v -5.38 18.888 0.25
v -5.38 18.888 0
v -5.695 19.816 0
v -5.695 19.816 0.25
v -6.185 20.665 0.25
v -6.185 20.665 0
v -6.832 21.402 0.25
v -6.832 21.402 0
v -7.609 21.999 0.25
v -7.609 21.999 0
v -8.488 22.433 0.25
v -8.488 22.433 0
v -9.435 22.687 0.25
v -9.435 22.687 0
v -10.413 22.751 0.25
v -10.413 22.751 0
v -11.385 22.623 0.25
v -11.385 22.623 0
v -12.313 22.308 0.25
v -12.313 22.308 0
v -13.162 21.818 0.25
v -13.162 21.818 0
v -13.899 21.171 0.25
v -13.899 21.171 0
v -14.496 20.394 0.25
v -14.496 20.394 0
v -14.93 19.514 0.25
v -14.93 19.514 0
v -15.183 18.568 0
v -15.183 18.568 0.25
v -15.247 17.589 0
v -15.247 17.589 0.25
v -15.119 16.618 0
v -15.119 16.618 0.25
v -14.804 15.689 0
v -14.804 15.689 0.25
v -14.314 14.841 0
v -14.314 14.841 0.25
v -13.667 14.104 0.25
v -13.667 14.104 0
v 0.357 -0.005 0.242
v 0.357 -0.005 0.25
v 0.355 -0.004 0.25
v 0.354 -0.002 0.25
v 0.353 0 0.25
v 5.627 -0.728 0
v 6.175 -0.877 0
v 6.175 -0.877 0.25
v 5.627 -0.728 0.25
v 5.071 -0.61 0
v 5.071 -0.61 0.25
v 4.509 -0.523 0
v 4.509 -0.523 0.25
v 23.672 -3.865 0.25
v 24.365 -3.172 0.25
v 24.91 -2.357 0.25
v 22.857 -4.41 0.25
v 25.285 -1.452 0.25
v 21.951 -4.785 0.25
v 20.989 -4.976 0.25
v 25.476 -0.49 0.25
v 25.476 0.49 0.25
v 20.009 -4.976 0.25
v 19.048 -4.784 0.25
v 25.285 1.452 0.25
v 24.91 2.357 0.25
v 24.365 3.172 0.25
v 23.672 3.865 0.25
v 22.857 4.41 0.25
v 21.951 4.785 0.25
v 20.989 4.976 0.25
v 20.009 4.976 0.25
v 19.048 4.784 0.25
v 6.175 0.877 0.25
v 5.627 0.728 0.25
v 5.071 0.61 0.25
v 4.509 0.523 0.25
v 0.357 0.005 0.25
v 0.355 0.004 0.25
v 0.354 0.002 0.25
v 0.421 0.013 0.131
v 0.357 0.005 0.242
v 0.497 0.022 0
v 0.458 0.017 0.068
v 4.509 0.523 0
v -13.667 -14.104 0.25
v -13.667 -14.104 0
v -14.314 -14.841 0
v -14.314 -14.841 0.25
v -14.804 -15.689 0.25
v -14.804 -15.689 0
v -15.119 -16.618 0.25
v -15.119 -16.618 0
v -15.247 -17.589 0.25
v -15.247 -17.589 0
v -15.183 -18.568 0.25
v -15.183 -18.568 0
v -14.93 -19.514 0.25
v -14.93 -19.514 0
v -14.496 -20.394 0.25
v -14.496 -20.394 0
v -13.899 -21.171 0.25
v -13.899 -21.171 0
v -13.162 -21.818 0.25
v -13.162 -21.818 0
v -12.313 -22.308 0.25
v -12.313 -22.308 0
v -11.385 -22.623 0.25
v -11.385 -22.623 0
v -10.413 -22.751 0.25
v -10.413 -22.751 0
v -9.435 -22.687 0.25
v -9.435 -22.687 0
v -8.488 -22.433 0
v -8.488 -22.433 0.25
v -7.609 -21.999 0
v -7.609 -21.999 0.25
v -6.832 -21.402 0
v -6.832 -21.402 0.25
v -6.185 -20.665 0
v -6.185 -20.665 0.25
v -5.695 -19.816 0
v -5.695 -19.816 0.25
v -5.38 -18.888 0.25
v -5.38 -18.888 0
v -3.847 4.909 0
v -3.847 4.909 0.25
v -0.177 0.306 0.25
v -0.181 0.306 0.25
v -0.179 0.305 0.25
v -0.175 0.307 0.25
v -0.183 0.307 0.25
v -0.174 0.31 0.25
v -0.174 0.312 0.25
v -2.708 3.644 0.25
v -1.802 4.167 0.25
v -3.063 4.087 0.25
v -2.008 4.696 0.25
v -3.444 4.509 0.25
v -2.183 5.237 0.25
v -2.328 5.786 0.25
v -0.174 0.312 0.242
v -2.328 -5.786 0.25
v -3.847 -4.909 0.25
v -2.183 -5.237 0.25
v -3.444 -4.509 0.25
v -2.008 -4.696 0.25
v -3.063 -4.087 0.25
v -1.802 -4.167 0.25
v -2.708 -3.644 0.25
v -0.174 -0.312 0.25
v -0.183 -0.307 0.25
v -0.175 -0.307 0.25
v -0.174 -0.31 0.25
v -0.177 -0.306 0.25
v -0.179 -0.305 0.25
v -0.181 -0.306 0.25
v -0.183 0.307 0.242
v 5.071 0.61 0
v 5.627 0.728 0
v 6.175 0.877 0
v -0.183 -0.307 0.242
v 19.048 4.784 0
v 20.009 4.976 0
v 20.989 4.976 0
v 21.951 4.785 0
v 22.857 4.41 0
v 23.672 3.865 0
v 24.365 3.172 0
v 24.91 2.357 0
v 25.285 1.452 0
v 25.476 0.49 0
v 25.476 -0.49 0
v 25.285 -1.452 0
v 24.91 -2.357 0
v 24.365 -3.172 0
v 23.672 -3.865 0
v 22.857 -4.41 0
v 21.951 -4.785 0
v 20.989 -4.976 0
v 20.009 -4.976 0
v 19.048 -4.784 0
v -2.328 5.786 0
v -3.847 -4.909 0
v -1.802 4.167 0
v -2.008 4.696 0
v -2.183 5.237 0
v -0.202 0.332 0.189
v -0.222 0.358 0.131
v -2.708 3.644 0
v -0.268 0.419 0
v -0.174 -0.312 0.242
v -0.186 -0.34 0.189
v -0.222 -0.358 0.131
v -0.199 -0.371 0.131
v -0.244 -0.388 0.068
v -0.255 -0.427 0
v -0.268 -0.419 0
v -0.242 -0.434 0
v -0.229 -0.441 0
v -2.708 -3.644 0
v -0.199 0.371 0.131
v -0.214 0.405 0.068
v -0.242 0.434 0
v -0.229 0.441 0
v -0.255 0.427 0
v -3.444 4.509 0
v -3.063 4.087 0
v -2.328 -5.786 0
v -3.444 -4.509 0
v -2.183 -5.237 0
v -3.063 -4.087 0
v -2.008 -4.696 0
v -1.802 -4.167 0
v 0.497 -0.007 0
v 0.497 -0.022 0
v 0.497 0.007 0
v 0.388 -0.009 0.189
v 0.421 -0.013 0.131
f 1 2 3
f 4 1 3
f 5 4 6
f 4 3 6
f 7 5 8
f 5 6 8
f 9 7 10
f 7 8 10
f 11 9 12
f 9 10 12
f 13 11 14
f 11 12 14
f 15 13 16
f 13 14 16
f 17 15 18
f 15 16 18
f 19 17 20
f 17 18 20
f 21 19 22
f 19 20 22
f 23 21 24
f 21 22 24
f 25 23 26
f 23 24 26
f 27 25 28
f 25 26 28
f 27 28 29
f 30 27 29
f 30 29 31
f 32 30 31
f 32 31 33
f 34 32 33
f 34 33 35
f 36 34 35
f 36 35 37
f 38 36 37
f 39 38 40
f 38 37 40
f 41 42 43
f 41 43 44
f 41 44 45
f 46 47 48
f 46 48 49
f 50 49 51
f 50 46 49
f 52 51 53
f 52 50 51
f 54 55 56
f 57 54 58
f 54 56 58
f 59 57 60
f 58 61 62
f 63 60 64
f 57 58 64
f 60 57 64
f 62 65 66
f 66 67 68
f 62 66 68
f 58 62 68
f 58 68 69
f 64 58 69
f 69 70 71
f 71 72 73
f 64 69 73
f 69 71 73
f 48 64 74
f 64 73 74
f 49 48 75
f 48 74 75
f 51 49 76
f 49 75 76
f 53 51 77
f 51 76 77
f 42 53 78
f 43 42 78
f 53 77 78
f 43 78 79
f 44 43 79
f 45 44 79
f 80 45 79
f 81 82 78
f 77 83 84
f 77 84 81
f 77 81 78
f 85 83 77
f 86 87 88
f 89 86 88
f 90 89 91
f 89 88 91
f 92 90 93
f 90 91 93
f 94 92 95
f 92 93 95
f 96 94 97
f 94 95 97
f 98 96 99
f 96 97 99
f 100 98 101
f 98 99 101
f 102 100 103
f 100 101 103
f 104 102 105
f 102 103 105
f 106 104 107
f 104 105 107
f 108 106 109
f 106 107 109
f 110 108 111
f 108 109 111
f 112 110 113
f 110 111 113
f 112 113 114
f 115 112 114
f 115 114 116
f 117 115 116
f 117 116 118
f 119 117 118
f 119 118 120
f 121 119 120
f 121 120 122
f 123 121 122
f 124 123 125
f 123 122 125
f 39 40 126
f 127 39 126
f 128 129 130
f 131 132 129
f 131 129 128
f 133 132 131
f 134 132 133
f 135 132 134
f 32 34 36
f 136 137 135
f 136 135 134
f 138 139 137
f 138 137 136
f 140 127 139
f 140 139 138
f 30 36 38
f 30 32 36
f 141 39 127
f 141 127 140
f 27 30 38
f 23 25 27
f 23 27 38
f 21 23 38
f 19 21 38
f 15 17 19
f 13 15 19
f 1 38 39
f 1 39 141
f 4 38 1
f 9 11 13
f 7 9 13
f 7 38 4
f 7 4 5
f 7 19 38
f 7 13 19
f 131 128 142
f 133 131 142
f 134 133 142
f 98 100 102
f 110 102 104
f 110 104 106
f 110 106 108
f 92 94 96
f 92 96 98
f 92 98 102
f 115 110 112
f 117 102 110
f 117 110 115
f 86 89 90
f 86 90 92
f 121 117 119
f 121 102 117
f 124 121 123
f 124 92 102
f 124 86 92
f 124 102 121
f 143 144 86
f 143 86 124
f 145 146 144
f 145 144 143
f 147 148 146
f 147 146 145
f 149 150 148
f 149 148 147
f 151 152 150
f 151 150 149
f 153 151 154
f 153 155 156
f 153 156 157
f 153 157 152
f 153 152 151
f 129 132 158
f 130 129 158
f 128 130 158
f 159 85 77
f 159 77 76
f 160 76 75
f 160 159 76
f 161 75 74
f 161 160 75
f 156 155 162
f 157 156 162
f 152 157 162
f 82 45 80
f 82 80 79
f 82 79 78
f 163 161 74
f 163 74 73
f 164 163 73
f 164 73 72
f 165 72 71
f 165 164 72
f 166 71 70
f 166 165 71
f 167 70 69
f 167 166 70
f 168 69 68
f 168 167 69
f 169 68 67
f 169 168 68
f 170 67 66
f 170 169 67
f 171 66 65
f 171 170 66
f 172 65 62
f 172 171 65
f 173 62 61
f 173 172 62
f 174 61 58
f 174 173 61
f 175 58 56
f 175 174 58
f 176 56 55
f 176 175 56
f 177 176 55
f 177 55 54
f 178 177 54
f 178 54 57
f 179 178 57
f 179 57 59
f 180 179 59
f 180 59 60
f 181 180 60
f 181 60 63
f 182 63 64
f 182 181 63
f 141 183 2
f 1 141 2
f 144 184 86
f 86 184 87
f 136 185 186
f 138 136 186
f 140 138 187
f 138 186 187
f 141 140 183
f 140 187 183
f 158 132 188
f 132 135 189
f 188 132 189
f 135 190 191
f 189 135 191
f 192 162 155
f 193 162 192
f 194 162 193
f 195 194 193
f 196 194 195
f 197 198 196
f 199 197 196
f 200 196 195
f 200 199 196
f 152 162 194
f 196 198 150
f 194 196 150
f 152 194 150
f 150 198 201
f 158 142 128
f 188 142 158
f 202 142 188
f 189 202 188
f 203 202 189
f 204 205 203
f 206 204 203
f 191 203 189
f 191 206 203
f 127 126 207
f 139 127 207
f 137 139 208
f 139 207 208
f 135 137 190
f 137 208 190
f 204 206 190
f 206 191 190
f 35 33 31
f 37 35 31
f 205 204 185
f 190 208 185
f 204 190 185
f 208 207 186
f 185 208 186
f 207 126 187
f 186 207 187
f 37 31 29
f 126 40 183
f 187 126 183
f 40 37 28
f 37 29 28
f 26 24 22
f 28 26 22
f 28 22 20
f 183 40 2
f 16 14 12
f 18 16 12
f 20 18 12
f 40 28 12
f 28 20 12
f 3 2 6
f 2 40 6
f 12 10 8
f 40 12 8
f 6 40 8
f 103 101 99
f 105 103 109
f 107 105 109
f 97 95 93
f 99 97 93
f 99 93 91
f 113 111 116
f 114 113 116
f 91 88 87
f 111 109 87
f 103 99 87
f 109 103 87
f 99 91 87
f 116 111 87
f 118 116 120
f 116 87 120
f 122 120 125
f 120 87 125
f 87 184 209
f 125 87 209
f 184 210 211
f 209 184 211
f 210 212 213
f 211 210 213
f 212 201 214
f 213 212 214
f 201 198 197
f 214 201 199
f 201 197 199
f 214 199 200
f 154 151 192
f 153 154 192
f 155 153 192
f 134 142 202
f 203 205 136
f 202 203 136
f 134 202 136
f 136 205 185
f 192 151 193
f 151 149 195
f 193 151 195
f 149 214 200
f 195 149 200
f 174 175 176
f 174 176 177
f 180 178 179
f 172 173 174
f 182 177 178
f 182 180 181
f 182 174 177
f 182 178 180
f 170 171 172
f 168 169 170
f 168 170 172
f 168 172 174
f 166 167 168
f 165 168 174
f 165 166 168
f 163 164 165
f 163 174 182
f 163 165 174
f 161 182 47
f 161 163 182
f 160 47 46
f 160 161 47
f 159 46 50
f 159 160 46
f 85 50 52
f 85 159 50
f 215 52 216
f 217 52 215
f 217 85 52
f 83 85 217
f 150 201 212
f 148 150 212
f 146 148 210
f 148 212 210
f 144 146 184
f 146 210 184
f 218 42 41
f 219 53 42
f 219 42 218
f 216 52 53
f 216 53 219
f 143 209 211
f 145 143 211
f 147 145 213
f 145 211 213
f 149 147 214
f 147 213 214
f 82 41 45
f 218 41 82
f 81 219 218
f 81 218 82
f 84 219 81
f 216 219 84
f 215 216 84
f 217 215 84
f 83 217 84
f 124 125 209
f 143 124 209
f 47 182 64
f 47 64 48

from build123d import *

# Parameters (mm, degrees)
EXTRUDE_2_DEPTH   = 0.25
EXTRUDE_2_2_DEPTH = 0.25
EXTRUDE_2_3_DEPTH = 0.25


with BuildPart() as part:
    # 草圖1 → 填料-伸長2 (new body)
    with BuildSketch(Plane.XY):
        with BuildLine():
            Line((0.357380647, 0.004961492), (4.50941379, 0.523267787))
            ThreePointArc((4.50941379, 0.523267787), (5.349803134, 0.664770922), (6.175092484, 0.877314741))
            Line((6.175092484, 0.877314741), (19.047808057, 4.784468472))
            ThreePointArc((19.047808057, 4.784468472), (25.5, 0), (19.047808057, -4.784468472))
            Line((19.047808057, -4.784468472), (6.175092484, -0.877314741))
            ThreePointArc((6.175092484, -0.877314741), (5.349803134, -0.664770922), (4.50941379, -0.523267787))
            Line((4.50941379, -0.523267787), (0.357380647, -0.004961492))
            ThreePointArc((0.357380647, -0.004961492), (0.353, 0), (0.357380647, 0.004961492))
        make_face()
    extrude(amount=EXTRUDE_2_DEPTH)


with BuildPart() as body_2:
    # 草圖1 → Extrude 2 2 (new body)
    with BuildSketch(Plane.XY):
        with BuildLine():
            Line((-0.182987102, -0.307019973), (-2.707870091, -3.643633005))
            ThreePointArc((-2.707870091, -3.643633005), (-3.250610073, -4.300679958), (-3.847323094, -4.909129591))
            Line((-3.847323094, -4.909129591), (-13.667375269, -14.103651428))
            ThreePointArc((-13.667375269, -14.103651428), (-12.75, -22.083647797), (-5.380432788, -18.8881199))
            Line((-5.380432788, -18.8881199), (-2.327769389, -5.786444332))
            ThreePointArc((-2.327769389, -5.786444332), (-2.09919306, -4.96545088), (-1.801543699, -4.166900792))
            Line((-1.801543699, -4.166900792), (-0.174393546, -0.311981465))
            ThreePointArc((-0.174393546, -0.311981465), (-0.1765, -0.305706968), (-0.182987102, -0.307019973))
        make_face()
    extrude(amount=EXTRUDE_2_2_DEPTH)


with BuildPart() as body_3:
    # 草圖1 → Extrude 2 3 (new body)
    with BuildSketch(Plane.XY):
        with BuildLine():
            Line((-0.174393546, 0.311981465), (-1.801543699, 4.166900792))
            ThreePointArc((-1.801543699, 4.166900792), (-2.09919306, 4.96545088), (-2.327769389, 5.786444332))
            Line((-2.327769389, 5.786444332), (-5.380432788, 18.8881199))
            ThreePointArc((-5.380432788, 18.8881199), (-12.75, 22.083647797), (-13.667375269, 14.103651428))
            Line((-13.667375269, 14.103651428), (-3.847323094, 4.909129591))
            ThreePointArc((-3.847323094, 4.909129591), (-3.250610073, 4.300679958), (-2.707870091, 3.643633005))
            Line((-2.707870091, 3.643633005), (-0.182987102, 0.307019973))
            ThreePointArc((-0.182987102, 0.307019973), (-0.1765, 0.305706968), (-0.174393546, 0.311981465))
        make_face()
    extrude(amount=EXTRUDE_2_3_DEPTH)


with BuildPart() as cut_revolve_1_tool:
    # 草圖2 → 除料-旋轉1 (revolve)
    with BuildSketch(Plane(origin=(0, 0, 0), x_dir=(1, 0, 0), z_dir=(0, 1, 0))):
        Polygon((0.353, -0.25), (0.497337567, 0), (0.353, 0), align=None)
    revolve(axis=Axis((0, 0, -0.385580205), (0, 0, 1)))


with BuildPart() as part_1:
    add(part.part)

    # 除料-旋轉1: cut by cut_revolve_1_tool
    add(cut_revolve_1_tool.part, mode=Mode.SUBTRACT)


with BuildPart() as body_2_1:
    add(body_2.part)

    # 除料-旋轉1: cut by cut_revolve_1_tool
    add(cut_revolve_1_tool.part, mode=Mode.SUBTRACT)


with BuildPart() as body_3_1:
    add(body_3.part)

    # 除料-旋轉1: cut by cut_revolve_1_tool
    add(cut_revolve_1_tool.part, mode=Mode.SUBTRACT)


solid = Compound([part_1.part, body_2_1.part, body_3_1.part])
